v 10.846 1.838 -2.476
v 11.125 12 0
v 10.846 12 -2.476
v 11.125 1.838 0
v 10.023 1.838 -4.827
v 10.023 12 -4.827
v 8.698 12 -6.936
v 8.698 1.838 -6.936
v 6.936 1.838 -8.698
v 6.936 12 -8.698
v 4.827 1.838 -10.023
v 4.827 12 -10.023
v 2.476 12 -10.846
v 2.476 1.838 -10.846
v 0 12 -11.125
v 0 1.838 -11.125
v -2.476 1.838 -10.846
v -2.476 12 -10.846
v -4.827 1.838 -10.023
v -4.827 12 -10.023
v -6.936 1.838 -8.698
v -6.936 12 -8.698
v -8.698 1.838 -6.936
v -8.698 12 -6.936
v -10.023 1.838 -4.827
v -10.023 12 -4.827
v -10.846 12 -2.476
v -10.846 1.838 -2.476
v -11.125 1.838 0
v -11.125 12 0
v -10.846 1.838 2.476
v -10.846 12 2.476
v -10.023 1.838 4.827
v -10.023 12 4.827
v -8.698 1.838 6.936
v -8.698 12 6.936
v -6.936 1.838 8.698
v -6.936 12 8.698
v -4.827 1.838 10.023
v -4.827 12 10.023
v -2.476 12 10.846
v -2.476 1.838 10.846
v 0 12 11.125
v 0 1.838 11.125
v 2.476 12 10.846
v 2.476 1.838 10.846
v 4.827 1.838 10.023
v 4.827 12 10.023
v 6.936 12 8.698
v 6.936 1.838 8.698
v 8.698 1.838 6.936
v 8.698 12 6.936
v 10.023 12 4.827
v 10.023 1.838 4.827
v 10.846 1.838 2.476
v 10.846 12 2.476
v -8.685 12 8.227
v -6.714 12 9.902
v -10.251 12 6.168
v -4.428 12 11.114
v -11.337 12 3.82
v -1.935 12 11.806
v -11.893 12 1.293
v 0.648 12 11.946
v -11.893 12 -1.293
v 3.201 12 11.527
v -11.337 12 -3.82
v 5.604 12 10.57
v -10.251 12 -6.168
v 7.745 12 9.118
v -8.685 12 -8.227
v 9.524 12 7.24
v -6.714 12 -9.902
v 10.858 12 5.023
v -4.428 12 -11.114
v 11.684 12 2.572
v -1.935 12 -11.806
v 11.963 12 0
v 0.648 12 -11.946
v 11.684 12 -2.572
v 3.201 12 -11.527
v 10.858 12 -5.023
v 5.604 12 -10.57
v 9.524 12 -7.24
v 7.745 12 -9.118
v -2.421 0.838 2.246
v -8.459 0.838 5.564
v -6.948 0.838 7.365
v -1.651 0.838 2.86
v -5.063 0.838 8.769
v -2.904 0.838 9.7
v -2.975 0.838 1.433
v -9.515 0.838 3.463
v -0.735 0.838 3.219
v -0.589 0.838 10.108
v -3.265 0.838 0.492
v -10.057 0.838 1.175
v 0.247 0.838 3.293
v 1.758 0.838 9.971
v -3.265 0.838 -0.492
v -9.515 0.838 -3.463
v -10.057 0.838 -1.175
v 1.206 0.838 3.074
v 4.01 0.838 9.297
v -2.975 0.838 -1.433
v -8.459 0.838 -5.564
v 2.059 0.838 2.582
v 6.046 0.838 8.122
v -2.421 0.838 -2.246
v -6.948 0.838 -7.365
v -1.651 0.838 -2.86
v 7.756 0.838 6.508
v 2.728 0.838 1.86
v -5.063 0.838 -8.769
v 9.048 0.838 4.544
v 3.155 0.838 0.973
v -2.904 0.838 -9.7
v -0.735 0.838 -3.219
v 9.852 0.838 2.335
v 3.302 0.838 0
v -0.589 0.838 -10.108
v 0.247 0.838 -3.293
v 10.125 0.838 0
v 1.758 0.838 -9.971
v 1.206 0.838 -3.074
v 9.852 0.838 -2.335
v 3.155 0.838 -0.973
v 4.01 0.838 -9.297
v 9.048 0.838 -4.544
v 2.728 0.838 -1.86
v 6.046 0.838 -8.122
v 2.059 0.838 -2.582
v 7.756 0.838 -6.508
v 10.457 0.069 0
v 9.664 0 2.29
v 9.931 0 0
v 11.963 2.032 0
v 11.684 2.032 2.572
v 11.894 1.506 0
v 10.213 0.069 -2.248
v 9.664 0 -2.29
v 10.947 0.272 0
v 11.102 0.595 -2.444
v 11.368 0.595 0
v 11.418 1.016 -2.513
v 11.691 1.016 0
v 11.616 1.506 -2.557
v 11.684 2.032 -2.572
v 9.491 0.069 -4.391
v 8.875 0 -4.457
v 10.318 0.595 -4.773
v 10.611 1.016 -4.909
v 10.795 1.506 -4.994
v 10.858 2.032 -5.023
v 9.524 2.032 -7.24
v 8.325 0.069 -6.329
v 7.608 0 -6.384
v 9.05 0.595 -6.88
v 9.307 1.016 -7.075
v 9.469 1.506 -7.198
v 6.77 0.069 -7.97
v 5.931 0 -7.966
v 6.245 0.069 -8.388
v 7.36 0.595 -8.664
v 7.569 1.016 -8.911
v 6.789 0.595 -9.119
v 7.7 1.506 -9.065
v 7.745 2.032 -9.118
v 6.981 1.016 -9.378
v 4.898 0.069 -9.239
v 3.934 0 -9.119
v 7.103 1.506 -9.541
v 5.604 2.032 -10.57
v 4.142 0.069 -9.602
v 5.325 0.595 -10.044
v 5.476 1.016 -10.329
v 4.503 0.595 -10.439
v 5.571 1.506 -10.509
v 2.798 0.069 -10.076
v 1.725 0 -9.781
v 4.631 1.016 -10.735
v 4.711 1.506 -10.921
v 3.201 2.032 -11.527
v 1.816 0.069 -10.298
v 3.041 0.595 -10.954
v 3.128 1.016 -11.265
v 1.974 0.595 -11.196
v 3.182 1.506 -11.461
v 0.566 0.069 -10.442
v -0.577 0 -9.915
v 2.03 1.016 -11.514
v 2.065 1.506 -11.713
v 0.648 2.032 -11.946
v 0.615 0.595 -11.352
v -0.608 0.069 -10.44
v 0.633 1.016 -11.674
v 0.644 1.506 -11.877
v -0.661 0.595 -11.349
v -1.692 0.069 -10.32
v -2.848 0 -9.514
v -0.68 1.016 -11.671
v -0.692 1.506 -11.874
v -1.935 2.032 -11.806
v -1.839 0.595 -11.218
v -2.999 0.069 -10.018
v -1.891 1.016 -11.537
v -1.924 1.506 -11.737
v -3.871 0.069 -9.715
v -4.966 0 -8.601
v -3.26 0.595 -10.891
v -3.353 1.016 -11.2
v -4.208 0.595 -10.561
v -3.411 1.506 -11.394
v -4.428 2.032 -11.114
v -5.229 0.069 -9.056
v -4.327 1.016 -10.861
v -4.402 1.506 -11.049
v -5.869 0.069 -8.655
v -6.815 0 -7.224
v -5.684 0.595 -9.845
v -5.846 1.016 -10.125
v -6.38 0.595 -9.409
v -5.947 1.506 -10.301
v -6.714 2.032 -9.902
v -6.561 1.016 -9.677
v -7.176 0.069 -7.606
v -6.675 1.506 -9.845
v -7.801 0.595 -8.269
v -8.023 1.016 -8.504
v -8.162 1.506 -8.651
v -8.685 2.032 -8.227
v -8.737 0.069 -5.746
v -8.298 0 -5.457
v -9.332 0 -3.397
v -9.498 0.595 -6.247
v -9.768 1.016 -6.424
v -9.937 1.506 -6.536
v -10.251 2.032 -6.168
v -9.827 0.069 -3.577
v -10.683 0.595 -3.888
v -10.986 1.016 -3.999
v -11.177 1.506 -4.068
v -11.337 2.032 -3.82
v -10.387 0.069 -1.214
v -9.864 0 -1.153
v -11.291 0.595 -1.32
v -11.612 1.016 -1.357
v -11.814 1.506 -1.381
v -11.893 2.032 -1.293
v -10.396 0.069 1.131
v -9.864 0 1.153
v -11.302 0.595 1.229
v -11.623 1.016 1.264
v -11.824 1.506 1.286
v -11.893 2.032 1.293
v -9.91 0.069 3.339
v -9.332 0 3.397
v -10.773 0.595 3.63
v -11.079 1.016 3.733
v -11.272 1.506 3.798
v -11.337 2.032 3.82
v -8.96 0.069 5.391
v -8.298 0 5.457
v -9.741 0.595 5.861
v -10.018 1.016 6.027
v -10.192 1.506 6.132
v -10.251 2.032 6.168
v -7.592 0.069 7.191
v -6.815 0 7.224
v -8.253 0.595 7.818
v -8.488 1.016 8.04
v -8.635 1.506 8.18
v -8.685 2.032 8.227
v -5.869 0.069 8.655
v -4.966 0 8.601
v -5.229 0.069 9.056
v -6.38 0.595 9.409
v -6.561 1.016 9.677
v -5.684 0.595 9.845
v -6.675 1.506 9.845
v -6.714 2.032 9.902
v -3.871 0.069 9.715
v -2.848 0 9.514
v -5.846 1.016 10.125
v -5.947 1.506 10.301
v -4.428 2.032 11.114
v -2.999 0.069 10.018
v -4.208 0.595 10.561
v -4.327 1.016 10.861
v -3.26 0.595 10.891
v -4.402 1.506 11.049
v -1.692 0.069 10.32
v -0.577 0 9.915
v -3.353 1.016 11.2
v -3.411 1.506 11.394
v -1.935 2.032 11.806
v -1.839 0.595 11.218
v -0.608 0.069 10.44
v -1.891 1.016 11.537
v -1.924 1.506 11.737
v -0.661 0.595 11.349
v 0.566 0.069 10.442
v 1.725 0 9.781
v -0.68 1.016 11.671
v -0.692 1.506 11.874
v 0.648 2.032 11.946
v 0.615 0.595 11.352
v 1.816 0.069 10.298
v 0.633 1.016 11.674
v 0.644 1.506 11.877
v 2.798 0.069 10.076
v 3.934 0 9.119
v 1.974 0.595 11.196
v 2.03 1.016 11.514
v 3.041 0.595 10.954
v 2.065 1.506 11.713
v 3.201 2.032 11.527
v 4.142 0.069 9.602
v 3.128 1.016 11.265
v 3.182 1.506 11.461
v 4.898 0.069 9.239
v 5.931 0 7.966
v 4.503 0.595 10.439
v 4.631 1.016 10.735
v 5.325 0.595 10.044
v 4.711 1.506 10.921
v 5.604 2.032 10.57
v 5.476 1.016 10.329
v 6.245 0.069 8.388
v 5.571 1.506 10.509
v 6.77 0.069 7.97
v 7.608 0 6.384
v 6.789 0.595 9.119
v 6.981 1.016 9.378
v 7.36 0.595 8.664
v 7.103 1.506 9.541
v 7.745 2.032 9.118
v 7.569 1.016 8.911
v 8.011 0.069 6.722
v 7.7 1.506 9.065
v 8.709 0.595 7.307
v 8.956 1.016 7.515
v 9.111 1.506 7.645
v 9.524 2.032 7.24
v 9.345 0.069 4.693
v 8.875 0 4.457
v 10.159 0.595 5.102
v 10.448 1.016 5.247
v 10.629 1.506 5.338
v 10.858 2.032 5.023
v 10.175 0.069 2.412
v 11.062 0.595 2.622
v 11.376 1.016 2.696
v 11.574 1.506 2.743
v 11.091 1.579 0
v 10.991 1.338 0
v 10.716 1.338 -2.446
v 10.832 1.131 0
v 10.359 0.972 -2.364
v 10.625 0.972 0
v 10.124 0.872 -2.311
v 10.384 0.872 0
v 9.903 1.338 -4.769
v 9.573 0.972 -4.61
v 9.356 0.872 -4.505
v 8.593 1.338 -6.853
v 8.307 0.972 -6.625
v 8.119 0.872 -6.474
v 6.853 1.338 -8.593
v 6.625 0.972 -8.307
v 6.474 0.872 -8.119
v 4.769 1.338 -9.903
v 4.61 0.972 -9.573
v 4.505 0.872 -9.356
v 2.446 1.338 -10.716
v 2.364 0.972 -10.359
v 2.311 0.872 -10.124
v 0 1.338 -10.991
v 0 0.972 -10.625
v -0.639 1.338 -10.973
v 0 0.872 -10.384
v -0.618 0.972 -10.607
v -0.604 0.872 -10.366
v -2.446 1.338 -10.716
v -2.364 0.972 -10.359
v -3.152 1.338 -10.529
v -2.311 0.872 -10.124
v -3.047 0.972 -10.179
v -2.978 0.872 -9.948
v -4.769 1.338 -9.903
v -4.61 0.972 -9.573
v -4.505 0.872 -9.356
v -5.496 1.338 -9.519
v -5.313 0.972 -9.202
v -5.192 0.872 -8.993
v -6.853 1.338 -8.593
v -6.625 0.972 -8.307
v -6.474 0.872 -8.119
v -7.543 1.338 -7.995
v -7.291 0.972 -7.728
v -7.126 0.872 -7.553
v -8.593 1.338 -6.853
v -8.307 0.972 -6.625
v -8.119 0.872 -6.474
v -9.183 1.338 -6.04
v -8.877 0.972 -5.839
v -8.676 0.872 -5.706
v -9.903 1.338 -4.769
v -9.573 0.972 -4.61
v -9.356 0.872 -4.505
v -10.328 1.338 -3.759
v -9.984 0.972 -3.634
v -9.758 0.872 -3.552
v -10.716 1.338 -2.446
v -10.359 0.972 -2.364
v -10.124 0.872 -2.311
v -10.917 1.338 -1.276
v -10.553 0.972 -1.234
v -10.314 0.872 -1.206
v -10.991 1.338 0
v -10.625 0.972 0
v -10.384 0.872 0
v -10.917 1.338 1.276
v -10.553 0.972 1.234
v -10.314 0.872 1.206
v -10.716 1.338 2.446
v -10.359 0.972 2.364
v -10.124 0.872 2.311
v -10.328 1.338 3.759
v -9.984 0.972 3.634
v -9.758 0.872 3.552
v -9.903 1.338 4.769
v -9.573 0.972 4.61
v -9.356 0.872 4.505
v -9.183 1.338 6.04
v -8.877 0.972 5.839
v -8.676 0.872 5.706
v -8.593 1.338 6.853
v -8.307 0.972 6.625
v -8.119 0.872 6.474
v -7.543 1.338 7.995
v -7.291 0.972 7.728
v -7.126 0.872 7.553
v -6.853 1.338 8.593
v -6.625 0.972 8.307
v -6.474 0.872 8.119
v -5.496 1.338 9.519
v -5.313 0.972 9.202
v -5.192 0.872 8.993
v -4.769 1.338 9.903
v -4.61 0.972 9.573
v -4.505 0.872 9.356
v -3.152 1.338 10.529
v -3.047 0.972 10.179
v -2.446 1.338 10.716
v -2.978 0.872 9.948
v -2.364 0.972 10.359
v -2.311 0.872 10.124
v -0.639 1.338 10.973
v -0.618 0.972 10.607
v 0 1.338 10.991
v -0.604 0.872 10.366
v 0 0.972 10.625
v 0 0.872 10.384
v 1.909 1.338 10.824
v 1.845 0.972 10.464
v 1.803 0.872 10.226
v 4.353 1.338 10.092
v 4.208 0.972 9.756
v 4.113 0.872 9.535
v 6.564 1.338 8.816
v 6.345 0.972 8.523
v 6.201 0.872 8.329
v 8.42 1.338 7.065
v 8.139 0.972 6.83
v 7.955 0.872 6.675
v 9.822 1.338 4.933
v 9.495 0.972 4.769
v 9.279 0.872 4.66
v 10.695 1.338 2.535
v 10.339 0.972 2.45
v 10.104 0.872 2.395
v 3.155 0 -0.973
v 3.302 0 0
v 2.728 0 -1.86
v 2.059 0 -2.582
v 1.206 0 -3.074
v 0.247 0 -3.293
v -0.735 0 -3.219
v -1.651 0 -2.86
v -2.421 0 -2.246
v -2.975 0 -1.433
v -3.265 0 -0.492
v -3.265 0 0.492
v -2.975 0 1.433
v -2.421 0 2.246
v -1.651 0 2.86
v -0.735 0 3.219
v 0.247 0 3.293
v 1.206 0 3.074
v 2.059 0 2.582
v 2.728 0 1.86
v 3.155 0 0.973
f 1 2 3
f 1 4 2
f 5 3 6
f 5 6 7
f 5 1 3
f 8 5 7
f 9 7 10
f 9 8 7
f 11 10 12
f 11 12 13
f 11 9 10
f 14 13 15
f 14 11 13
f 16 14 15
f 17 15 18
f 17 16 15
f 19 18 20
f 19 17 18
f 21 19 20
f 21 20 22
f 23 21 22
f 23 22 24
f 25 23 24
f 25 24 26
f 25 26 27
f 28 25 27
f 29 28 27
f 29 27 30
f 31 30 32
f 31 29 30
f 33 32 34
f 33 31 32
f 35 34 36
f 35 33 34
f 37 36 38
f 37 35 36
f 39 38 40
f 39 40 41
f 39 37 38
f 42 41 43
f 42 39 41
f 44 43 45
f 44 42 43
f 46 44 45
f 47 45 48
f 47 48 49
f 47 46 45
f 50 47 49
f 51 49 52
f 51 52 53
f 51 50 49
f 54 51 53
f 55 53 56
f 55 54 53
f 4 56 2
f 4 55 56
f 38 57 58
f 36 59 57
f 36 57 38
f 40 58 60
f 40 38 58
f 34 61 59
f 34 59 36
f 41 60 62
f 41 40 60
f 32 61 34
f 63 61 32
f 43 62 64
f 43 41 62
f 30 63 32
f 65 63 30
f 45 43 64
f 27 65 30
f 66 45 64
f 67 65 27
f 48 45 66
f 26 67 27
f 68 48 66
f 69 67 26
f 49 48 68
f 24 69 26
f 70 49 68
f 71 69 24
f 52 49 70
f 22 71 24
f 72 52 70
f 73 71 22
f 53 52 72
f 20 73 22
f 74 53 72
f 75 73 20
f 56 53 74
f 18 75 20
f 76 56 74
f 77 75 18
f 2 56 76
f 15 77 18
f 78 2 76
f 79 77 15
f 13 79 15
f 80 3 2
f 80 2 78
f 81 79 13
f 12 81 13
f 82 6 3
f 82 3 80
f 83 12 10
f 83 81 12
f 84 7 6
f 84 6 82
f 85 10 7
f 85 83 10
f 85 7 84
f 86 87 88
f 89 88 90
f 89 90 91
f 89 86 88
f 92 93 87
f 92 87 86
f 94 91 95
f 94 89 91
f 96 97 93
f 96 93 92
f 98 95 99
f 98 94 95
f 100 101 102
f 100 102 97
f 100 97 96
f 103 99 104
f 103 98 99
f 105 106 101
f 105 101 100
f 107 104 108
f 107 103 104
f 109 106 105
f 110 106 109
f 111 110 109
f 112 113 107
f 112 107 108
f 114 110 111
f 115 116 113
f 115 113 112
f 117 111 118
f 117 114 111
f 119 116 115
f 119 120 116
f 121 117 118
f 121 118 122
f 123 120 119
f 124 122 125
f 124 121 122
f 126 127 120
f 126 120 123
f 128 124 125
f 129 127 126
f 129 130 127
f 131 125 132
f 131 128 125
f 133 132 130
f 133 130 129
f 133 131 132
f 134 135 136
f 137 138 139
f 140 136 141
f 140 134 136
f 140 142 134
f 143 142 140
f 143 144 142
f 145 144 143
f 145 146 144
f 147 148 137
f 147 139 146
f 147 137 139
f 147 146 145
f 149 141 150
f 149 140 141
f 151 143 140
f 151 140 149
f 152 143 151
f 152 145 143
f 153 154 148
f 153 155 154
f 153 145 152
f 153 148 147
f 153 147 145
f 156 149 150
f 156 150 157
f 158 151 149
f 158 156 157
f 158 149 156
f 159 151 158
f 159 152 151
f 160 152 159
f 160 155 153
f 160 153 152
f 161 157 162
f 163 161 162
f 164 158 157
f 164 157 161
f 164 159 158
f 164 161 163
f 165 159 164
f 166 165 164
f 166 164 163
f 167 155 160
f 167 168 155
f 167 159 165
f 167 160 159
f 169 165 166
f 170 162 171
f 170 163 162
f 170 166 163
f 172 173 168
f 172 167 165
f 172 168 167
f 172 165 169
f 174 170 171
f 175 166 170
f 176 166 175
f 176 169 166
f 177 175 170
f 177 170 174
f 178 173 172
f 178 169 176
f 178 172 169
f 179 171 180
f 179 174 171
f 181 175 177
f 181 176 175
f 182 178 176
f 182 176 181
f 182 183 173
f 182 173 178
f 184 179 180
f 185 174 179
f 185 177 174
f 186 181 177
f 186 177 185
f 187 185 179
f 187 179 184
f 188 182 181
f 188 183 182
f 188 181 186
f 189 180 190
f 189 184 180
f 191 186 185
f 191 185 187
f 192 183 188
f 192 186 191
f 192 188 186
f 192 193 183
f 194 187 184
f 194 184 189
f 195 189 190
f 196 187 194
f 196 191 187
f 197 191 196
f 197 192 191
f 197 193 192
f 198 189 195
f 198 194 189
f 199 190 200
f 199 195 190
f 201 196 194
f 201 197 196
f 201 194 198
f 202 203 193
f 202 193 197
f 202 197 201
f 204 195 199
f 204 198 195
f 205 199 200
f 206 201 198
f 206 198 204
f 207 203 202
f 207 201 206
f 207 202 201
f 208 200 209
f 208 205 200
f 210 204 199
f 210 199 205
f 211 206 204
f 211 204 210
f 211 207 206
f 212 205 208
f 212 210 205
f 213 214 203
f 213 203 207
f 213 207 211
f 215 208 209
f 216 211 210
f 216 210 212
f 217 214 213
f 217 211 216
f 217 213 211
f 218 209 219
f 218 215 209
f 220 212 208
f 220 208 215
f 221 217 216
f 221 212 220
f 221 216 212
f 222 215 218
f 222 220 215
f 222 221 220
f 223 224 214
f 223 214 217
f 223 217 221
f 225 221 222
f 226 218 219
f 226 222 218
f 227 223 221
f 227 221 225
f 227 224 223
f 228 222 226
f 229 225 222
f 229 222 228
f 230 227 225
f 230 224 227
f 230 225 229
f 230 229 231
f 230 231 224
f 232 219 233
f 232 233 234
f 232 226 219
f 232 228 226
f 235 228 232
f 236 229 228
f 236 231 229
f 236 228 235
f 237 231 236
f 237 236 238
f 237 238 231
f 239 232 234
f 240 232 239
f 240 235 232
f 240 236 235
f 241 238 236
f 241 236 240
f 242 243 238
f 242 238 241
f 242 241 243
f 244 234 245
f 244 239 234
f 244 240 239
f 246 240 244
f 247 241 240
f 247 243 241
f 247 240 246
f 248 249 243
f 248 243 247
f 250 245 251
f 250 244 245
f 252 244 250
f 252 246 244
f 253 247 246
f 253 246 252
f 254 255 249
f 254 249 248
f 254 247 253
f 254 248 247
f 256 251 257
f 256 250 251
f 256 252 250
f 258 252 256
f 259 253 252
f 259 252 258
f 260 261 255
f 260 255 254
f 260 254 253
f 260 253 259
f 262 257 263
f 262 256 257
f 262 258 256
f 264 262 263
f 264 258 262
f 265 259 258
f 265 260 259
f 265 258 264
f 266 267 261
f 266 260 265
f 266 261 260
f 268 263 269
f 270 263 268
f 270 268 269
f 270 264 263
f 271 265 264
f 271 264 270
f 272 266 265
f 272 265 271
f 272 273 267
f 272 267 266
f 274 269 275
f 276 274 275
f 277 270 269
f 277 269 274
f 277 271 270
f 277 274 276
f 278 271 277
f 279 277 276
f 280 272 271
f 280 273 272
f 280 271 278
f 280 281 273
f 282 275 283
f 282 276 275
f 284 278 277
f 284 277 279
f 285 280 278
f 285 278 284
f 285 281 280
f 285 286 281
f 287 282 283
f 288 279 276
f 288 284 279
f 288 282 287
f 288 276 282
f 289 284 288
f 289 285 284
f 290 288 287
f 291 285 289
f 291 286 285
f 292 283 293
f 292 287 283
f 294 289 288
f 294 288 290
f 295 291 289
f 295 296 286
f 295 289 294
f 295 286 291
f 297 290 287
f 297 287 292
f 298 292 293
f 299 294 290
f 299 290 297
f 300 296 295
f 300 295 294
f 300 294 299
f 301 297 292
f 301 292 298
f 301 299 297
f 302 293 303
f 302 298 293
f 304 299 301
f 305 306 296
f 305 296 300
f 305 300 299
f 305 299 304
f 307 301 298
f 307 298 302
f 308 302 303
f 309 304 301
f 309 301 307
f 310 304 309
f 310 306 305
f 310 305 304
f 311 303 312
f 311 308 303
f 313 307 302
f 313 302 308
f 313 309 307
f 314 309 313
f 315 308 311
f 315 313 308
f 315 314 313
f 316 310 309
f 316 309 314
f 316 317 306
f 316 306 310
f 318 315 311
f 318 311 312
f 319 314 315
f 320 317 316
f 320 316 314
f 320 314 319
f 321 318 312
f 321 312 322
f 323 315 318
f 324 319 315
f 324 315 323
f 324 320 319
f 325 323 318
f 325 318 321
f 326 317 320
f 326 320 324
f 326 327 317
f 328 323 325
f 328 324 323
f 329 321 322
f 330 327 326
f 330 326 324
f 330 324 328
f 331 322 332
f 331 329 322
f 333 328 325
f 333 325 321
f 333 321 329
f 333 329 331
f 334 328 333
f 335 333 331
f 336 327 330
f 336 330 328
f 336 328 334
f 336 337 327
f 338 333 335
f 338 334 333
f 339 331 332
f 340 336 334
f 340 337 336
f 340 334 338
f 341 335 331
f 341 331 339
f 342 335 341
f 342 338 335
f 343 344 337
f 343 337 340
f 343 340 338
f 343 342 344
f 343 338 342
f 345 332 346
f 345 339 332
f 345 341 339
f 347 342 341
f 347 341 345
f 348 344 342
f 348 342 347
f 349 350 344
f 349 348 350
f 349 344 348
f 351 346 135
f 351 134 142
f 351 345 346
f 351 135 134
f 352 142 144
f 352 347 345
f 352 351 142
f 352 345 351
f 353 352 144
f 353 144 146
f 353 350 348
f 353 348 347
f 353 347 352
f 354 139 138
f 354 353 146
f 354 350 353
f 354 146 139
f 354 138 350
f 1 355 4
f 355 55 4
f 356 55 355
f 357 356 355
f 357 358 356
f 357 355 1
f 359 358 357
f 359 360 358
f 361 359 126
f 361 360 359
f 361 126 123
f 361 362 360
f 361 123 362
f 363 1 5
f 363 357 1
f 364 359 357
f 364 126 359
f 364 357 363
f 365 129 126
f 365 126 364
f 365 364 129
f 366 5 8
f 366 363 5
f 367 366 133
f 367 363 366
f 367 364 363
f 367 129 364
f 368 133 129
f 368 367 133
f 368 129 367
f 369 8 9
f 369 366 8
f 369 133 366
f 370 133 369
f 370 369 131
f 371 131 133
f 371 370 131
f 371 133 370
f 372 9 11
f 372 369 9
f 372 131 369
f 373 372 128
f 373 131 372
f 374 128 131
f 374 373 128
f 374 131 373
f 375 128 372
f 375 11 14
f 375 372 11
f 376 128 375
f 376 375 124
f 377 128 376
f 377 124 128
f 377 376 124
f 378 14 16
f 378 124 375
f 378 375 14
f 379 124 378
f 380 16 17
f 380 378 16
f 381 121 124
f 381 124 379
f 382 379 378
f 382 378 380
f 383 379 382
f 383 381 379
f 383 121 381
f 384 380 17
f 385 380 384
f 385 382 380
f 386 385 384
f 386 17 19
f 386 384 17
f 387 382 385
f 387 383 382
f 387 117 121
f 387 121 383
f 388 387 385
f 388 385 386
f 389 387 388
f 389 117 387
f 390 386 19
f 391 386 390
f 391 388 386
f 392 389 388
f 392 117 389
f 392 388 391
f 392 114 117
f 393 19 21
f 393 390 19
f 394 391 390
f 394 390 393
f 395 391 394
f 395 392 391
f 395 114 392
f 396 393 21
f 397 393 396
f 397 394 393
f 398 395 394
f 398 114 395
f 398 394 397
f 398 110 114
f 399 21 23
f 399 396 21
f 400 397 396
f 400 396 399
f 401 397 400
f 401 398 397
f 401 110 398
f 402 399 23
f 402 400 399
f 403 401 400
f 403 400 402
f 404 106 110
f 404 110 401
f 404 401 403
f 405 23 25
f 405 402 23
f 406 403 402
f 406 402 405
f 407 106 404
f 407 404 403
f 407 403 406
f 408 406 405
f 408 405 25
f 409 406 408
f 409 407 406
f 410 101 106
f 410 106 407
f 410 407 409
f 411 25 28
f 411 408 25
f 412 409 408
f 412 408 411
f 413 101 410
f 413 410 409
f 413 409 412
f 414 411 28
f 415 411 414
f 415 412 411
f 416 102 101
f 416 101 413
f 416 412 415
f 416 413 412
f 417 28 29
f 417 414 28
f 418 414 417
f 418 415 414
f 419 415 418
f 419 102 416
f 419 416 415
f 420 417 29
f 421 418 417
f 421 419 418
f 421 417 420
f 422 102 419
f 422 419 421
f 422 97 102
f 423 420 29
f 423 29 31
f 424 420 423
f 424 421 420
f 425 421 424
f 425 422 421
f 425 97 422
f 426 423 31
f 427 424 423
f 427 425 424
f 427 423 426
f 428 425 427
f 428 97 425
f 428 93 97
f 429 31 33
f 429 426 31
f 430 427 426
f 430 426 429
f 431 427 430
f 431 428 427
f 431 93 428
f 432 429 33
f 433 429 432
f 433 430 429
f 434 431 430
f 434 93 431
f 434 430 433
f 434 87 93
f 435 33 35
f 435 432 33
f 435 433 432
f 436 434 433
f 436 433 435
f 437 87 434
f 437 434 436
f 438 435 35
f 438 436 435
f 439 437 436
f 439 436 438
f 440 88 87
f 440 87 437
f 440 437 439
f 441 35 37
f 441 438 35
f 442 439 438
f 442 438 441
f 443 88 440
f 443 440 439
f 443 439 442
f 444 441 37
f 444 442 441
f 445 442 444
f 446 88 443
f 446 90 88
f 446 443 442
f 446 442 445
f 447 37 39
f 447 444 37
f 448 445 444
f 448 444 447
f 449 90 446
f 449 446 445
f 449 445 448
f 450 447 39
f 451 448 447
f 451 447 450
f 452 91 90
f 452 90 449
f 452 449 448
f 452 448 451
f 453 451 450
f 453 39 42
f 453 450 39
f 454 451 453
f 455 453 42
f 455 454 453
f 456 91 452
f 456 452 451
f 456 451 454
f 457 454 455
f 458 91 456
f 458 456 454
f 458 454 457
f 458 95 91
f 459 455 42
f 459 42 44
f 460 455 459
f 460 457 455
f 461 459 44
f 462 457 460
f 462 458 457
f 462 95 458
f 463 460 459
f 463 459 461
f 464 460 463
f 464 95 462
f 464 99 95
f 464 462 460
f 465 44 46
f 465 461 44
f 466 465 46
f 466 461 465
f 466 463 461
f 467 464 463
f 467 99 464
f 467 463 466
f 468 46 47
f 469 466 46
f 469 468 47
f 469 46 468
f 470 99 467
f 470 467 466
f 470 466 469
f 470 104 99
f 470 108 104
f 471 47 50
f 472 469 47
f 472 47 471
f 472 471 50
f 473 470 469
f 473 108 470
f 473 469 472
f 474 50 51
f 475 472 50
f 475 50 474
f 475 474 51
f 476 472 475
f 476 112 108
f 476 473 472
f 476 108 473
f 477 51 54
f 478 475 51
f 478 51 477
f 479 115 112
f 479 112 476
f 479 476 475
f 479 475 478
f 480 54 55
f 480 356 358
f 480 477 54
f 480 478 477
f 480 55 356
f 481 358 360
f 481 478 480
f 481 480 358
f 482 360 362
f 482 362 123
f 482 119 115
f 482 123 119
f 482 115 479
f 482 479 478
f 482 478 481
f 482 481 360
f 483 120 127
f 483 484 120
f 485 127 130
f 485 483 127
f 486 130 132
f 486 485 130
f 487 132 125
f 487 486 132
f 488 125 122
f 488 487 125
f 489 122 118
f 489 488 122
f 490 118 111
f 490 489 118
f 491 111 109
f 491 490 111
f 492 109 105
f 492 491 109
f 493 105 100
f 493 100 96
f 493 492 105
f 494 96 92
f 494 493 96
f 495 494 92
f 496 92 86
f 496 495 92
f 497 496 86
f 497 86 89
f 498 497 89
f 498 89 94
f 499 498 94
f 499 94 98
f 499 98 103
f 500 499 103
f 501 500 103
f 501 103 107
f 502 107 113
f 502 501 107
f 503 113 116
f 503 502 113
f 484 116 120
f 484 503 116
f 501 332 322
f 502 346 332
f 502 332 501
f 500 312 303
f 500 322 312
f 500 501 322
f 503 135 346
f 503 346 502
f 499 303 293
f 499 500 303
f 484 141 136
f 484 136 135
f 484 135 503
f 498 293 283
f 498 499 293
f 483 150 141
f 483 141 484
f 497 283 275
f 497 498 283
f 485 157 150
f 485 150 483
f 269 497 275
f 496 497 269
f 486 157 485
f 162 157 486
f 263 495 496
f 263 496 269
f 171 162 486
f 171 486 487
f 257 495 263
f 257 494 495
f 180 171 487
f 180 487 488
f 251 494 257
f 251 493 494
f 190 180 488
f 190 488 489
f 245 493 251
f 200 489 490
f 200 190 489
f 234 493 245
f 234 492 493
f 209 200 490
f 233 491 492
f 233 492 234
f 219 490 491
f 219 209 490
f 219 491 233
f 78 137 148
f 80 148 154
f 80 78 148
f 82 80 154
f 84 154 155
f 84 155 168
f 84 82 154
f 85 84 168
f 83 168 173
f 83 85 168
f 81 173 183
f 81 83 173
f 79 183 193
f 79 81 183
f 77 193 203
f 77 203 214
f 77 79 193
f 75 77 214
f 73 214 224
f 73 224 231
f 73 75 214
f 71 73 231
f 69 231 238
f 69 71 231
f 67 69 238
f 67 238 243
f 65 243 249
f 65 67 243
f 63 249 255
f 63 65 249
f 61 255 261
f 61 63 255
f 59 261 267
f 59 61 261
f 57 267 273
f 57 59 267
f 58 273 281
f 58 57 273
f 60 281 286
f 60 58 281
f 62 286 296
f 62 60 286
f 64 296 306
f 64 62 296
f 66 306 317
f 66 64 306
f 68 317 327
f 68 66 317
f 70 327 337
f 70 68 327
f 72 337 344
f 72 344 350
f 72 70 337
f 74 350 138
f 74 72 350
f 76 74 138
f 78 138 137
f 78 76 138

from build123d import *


with BuildPart() as part:
    # Sketch1 → Revolve1 (revolve)
    with BuildSketch(Plane.XY):
        with BuildLine():
            Line((3.302, 0), (9.9314, 0))
            ThreePointArc((9.9314, 0), (11.368240979, 0.595159021), (11.9634, 2.032))
            Line((11.9634, 2.032), (11.9634, 12))
            Line((11.9634, 12), (11.1252, 12))
            Line((11.1252, 12), (11.1252, 1.8382))
            ThreePointArc((11.1252, 1.8382), (10.832306781, 1.131093219), (10.1252, 0.8382))
            Line((10.1252, 0.8382), (3.302, 0.8382))
            Line((3.302, 0.8382), (3.302, 0))
        make_face()
    revolve(axis=Axis((0, 0, 0), (0, 1, 0)))


solid = part.part
